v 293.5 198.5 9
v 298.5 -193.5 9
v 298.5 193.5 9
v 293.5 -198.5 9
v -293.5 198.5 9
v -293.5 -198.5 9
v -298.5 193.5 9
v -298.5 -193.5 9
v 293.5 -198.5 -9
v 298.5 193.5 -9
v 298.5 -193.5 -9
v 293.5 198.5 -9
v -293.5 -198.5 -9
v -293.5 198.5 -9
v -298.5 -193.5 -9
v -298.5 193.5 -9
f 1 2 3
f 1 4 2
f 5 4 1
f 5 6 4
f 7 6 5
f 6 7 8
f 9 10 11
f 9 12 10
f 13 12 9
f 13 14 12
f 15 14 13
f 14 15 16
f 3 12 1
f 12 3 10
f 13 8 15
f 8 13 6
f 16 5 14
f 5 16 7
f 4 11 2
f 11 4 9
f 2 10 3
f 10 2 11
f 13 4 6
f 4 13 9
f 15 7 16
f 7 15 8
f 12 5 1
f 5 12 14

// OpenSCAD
// Parameters
sheet_L = 600; //[300:1200:1]
sheet_W = 400; //[200:800:1]
sheet_T = 18; //[9:36:1]
corner_R = 8; //[2:16:1]
chamfer_C = 1.5; //[0.5:3:0.1]
eps = 0.8; //[0.2:2:0.1]

// Base Shapes
module mdf_sheet_panel() {
  cube([sheet_L, sheet_W, sheet_T], center=true);
}

module corner_rounding() {
  linear_extrude(height=sheet_T + 2*eps, center=true) {
    polygon(points=[
      [-sheet_L/2 + corner_R, -sheet_W/2],
      [sheet_L/2 - corner_R, -sheet_W/2],
      [sheet_L/2, -sheet_W/2 + corner_R],
      [sheet_L/2, sheet_W/2 - corner_R],
      [sheet_L/2 - corner_R, sheet_W/2],
      [-sheet_L/2 + corner_R, sheet_W/2],
      [-sheet_L/2, sheet_W/2 - corner_R],
      [-sheet_L/2, -sheet_W/2 + corner_R]
    ]);
  }
}

module edge_chamfer() {
  linear_extrude(height=sheet_T + 2*eps, center=true) {
    polygon(points=[
      [-sheet_L/2 + chamfer_C, -sheet_W/2 + chamfer_C],
      [sheet_L/2 - chamfer_C, -sheet_W/2 + chamfer_C],
      [sheet_L/2 - chamfer_C, sheet_W/2 - chamfer_C],
      [-sheet_L/2 + chamfer_C, sheet_W/2 - chamfer_C]
    ]);
  }
}

module material_label_text() {
  cube([eps, eps, eps], center=true);
}

// Operations
module op_round_corners() {
  intersection() {
    mdf_sheet_panel();
    corner_rounding();
  }
}

module op_edge_chamfer_approx() {
  intersection() {
    op_round_corners();
    edge_chamfer();
  }
}

module op_final_union() {
  union() {
    op_edge_chamfer_approx();
    material_label_text();
  }
}

// Final Output
op_final_union();
